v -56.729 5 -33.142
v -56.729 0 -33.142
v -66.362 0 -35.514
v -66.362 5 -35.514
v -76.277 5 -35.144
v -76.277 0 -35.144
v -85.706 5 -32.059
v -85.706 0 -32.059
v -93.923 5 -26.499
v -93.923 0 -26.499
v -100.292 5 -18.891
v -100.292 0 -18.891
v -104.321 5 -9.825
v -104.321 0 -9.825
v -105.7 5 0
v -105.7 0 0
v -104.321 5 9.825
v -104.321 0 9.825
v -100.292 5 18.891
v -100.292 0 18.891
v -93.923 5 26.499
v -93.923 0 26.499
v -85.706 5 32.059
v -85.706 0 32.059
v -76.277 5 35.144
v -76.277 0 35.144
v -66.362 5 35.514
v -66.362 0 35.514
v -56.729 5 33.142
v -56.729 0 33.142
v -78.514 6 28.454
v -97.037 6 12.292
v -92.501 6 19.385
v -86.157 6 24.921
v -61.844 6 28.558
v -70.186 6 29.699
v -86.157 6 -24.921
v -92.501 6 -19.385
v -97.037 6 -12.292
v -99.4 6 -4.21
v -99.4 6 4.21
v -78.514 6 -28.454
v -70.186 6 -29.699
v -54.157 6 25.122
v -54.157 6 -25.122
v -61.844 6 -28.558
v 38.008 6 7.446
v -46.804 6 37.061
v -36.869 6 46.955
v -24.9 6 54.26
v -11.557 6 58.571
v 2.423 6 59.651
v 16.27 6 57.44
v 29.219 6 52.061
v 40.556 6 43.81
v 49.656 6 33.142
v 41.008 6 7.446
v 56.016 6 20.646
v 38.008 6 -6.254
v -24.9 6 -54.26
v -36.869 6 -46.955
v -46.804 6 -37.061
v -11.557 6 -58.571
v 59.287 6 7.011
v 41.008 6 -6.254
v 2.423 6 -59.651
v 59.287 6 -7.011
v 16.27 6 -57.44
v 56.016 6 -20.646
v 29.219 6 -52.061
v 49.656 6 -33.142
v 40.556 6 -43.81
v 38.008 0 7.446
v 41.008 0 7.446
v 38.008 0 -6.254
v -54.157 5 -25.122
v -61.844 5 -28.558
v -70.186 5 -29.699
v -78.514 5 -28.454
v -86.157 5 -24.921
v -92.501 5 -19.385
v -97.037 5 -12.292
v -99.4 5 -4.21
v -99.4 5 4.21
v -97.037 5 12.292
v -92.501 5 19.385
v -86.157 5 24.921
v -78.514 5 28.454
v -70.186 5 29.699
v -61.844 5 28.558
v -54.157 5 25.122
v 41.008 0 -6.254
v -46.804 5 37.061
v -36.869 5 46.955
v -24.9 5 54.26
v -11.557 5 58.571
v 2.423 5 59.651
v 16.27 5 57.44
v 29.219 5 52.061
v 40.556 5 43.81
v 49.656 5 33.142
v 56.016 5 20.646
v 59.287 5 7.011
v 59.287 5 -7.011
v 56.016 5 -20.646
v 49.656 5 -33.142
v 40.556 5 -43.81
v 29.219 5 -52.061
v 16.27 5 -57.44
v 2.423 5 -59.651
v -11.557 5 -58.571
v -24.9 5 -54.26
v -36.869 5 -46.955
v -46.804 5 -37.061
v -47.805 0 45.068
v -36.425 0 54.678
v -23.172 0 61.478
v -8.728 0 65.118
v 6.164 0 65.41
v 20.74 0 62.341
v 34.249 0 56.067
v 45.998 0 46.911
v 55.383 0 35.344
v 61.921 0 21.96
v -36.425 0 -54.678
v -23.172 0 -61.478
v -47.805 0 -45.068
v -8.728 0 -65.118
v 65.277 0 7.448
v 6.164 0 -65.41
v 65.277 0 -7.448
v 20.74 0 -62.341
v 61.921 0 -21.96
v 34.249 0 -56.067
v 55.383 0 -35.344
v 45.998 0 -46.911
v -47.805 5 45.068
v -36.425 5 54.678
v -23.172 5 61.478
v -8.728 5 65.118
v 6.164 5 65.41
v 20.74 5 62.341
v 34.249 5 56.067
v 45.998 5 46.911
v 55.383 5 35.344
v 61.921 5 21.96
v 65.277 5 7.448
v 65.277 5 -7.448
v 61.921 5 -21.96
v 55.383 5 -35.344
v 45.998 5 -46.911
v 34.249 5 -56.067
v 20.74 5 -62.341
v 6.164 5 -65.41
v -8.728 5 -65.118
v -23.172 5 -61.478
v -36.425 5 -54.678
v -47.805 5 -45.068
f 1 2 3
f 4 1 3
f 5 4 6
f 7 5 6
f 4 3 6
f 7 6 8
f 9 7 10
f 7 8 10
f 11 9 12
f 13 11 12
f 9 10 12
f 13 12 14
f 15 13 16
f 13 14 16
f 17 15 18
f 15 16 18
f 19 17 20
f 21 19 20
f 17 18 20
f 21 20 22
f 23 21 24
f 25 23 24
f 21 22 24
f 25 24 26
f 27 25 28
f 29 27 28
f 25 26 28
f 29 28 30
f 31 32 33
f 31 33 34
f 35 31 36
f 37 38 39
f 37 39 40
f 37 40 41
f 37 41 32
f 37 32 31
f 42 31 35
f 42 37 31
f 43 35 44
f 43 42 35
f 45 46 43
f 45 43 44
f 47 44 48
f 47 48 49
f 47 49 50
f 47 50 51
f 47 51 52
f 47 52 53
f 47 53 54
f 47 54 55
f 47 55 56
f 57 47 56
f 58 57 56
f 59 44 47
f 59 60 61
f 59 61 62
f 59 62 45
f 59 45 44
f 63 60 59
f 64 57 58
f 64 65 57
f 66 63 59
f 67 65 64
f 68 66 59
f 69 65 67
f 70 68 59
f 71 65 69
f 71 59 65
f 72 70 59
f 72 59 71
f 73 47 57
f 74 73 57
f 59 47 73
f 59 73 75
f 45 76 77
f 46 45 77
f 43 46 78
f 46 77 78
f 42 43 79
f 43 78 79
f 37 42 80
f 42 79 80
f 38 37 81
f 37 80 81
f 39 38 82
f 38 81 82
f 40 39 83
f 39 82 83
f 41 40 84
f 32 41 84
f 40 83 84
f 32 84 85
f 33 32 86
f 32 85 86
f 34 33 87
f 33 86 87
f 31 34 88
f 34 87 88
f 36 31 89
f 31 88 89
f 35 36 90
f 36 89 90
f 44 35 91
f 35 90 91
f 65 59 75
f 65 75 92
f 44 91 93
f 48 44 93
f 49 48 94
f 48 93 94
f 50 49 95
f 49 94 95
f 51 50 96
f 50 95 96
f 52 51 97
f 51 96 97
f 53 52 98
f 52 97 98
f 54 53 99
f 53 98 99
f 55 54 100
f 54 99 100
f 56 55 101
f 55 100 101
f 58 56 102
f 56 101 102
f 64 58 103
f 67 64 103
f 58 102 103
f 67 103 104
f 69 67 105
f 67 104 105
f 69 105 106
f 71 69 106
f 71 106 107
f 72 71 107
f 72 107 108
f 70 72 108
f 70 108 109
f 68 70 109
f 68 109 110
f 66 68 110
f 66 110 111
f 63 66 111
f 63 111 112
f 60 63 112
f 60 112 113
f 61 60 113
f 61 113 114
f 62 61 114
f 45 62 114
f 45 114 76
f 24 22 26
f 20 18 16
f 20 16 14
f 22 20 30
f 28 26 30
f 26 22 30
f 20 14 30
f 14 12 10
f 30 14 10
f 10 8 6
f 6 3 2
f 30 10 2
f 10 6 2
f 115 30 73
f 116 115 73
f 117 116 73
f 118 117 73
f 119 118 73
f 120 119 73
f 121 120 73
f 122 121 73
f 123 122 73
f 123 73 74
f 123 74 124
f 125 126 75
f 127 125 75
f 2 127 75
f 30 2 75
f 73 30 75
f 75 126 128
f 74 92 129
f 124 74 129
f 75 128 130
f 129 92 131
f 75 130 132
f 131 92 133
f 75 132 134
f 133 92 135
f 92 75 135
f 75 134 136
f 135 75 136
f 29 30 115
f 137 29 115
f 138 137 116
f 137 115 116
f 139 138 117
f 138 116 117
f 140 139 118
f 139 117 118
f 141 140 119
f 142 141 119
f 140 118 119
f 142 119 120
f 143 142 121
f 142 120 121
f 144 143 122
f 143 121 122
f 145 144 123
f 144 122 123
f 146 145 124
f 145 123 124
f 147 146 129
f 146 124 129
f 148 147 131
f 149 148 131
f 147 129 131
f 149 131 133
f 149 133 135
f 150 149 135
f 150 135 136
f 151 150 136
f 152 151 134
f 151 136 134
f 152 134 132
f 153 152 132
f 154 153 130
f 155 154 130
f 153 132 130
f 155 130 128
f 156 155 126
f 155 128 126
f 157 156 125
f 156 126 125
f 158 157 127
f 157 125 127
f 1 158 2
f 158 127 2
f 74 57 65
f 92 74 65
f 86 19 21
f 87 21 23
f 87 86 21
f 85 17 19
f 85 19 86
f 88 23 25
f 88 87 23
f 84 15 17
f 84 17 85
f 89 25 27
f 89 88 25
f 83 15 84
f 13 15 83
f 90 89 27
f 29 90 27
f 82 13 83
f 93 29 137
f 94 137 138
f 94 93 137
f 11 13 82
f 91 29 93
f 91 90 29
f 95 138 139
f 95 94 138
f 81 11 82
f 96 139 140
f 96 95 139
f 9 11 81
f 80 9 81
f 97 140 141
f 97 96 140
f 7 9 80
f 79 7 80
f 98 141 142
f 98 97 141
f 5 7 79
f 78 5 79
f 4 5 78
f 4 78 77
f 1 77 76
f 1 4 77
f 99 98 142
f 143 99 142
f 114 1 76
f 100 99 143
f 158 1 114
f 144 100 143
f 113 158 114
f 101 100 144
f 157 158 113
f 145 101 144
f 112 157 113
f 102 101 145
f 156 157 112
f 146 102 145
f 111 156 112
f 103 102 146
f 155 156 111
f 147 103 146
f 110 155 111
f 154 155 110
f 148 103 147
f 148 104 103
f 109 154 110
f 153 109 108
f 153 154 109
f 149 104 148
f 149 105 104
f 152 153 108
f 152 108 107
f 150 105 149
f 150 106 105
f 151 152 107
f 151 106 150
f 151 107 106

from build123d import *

# Parameters (mm, degrees)
BOSS_EXTRUDE1_DEPTH = 6
BOSS_EXTRUDE2_DEPTH = 5
SKETCH2_W           = 3
SKETCH2_H           = 13.7
CUT_EXTRUDE1_DEPTH  = 7


with BuildPart() as part:
    # Sketch1 → Boss-Extrude1 (new body)
    with BuildSketch(Plane(origin=(0, 0, 0), x_dir=(1, 0, 0), z_dir=(0, 1, 0))):
        with BuildLine():
            ThreePointArc((-54.157142857, -25.121581908), (59.7, 0), (-54.157142857, 25.121581908))
            ThreePointArc((-54.157142857, 25.121581908), (-99.7, 0), (-54.157142857, -25.121581908))
        make_face()
    extrude(amount=BOSS_EXTRUDE1_DEPTH)

    # Sketch1<3> → Boss-Extrude2 (add)
    with BuildSketch(Plane(origin=(0, 0, 0), x_dir=(1, 0, 0), z_dir=(0, 1, 0))):
        with BuildLine():
            ThreePointArc((-56.728571429, -33.141502435), (65.7, 0), (-56.728571429, 33.141502435))
            ThreePointArc((-56.728571429, 33.141502435), (-105.7, 0), (-56.728571429, -33.141502435))
        make_face()
        with BuildLine():
            ThreePointArc((-54.157142857, -25.121581908), (59.7, 0), (-54.157142857, 25.121581908))
            ThreePointArc((-54.157142857, 25.121581908), (-99.7, 0), (-54.157142857, -25.121581908))
        make_face(mode=Mode.SUBTRACT)
    extrude(amount=BOSS_EXTRUDE2_DEPTH)

    # Sketch2 → Cut-Extrude1 (cut, through all)
    with BuildSketch(Plane(origin=(0, 6, 0), x_dir=(1, 0, 0), z_dir=(0, 1, 0))):
        with Locations((39.508087625, -0.596031436)):
            Rectangle(SKETCH2_W, SKETCH2_H)
    extrude(amount=-CUT_EXTRUDE1_DEPTH, mode=Mode.SUBTRACT)


solid = part.part
